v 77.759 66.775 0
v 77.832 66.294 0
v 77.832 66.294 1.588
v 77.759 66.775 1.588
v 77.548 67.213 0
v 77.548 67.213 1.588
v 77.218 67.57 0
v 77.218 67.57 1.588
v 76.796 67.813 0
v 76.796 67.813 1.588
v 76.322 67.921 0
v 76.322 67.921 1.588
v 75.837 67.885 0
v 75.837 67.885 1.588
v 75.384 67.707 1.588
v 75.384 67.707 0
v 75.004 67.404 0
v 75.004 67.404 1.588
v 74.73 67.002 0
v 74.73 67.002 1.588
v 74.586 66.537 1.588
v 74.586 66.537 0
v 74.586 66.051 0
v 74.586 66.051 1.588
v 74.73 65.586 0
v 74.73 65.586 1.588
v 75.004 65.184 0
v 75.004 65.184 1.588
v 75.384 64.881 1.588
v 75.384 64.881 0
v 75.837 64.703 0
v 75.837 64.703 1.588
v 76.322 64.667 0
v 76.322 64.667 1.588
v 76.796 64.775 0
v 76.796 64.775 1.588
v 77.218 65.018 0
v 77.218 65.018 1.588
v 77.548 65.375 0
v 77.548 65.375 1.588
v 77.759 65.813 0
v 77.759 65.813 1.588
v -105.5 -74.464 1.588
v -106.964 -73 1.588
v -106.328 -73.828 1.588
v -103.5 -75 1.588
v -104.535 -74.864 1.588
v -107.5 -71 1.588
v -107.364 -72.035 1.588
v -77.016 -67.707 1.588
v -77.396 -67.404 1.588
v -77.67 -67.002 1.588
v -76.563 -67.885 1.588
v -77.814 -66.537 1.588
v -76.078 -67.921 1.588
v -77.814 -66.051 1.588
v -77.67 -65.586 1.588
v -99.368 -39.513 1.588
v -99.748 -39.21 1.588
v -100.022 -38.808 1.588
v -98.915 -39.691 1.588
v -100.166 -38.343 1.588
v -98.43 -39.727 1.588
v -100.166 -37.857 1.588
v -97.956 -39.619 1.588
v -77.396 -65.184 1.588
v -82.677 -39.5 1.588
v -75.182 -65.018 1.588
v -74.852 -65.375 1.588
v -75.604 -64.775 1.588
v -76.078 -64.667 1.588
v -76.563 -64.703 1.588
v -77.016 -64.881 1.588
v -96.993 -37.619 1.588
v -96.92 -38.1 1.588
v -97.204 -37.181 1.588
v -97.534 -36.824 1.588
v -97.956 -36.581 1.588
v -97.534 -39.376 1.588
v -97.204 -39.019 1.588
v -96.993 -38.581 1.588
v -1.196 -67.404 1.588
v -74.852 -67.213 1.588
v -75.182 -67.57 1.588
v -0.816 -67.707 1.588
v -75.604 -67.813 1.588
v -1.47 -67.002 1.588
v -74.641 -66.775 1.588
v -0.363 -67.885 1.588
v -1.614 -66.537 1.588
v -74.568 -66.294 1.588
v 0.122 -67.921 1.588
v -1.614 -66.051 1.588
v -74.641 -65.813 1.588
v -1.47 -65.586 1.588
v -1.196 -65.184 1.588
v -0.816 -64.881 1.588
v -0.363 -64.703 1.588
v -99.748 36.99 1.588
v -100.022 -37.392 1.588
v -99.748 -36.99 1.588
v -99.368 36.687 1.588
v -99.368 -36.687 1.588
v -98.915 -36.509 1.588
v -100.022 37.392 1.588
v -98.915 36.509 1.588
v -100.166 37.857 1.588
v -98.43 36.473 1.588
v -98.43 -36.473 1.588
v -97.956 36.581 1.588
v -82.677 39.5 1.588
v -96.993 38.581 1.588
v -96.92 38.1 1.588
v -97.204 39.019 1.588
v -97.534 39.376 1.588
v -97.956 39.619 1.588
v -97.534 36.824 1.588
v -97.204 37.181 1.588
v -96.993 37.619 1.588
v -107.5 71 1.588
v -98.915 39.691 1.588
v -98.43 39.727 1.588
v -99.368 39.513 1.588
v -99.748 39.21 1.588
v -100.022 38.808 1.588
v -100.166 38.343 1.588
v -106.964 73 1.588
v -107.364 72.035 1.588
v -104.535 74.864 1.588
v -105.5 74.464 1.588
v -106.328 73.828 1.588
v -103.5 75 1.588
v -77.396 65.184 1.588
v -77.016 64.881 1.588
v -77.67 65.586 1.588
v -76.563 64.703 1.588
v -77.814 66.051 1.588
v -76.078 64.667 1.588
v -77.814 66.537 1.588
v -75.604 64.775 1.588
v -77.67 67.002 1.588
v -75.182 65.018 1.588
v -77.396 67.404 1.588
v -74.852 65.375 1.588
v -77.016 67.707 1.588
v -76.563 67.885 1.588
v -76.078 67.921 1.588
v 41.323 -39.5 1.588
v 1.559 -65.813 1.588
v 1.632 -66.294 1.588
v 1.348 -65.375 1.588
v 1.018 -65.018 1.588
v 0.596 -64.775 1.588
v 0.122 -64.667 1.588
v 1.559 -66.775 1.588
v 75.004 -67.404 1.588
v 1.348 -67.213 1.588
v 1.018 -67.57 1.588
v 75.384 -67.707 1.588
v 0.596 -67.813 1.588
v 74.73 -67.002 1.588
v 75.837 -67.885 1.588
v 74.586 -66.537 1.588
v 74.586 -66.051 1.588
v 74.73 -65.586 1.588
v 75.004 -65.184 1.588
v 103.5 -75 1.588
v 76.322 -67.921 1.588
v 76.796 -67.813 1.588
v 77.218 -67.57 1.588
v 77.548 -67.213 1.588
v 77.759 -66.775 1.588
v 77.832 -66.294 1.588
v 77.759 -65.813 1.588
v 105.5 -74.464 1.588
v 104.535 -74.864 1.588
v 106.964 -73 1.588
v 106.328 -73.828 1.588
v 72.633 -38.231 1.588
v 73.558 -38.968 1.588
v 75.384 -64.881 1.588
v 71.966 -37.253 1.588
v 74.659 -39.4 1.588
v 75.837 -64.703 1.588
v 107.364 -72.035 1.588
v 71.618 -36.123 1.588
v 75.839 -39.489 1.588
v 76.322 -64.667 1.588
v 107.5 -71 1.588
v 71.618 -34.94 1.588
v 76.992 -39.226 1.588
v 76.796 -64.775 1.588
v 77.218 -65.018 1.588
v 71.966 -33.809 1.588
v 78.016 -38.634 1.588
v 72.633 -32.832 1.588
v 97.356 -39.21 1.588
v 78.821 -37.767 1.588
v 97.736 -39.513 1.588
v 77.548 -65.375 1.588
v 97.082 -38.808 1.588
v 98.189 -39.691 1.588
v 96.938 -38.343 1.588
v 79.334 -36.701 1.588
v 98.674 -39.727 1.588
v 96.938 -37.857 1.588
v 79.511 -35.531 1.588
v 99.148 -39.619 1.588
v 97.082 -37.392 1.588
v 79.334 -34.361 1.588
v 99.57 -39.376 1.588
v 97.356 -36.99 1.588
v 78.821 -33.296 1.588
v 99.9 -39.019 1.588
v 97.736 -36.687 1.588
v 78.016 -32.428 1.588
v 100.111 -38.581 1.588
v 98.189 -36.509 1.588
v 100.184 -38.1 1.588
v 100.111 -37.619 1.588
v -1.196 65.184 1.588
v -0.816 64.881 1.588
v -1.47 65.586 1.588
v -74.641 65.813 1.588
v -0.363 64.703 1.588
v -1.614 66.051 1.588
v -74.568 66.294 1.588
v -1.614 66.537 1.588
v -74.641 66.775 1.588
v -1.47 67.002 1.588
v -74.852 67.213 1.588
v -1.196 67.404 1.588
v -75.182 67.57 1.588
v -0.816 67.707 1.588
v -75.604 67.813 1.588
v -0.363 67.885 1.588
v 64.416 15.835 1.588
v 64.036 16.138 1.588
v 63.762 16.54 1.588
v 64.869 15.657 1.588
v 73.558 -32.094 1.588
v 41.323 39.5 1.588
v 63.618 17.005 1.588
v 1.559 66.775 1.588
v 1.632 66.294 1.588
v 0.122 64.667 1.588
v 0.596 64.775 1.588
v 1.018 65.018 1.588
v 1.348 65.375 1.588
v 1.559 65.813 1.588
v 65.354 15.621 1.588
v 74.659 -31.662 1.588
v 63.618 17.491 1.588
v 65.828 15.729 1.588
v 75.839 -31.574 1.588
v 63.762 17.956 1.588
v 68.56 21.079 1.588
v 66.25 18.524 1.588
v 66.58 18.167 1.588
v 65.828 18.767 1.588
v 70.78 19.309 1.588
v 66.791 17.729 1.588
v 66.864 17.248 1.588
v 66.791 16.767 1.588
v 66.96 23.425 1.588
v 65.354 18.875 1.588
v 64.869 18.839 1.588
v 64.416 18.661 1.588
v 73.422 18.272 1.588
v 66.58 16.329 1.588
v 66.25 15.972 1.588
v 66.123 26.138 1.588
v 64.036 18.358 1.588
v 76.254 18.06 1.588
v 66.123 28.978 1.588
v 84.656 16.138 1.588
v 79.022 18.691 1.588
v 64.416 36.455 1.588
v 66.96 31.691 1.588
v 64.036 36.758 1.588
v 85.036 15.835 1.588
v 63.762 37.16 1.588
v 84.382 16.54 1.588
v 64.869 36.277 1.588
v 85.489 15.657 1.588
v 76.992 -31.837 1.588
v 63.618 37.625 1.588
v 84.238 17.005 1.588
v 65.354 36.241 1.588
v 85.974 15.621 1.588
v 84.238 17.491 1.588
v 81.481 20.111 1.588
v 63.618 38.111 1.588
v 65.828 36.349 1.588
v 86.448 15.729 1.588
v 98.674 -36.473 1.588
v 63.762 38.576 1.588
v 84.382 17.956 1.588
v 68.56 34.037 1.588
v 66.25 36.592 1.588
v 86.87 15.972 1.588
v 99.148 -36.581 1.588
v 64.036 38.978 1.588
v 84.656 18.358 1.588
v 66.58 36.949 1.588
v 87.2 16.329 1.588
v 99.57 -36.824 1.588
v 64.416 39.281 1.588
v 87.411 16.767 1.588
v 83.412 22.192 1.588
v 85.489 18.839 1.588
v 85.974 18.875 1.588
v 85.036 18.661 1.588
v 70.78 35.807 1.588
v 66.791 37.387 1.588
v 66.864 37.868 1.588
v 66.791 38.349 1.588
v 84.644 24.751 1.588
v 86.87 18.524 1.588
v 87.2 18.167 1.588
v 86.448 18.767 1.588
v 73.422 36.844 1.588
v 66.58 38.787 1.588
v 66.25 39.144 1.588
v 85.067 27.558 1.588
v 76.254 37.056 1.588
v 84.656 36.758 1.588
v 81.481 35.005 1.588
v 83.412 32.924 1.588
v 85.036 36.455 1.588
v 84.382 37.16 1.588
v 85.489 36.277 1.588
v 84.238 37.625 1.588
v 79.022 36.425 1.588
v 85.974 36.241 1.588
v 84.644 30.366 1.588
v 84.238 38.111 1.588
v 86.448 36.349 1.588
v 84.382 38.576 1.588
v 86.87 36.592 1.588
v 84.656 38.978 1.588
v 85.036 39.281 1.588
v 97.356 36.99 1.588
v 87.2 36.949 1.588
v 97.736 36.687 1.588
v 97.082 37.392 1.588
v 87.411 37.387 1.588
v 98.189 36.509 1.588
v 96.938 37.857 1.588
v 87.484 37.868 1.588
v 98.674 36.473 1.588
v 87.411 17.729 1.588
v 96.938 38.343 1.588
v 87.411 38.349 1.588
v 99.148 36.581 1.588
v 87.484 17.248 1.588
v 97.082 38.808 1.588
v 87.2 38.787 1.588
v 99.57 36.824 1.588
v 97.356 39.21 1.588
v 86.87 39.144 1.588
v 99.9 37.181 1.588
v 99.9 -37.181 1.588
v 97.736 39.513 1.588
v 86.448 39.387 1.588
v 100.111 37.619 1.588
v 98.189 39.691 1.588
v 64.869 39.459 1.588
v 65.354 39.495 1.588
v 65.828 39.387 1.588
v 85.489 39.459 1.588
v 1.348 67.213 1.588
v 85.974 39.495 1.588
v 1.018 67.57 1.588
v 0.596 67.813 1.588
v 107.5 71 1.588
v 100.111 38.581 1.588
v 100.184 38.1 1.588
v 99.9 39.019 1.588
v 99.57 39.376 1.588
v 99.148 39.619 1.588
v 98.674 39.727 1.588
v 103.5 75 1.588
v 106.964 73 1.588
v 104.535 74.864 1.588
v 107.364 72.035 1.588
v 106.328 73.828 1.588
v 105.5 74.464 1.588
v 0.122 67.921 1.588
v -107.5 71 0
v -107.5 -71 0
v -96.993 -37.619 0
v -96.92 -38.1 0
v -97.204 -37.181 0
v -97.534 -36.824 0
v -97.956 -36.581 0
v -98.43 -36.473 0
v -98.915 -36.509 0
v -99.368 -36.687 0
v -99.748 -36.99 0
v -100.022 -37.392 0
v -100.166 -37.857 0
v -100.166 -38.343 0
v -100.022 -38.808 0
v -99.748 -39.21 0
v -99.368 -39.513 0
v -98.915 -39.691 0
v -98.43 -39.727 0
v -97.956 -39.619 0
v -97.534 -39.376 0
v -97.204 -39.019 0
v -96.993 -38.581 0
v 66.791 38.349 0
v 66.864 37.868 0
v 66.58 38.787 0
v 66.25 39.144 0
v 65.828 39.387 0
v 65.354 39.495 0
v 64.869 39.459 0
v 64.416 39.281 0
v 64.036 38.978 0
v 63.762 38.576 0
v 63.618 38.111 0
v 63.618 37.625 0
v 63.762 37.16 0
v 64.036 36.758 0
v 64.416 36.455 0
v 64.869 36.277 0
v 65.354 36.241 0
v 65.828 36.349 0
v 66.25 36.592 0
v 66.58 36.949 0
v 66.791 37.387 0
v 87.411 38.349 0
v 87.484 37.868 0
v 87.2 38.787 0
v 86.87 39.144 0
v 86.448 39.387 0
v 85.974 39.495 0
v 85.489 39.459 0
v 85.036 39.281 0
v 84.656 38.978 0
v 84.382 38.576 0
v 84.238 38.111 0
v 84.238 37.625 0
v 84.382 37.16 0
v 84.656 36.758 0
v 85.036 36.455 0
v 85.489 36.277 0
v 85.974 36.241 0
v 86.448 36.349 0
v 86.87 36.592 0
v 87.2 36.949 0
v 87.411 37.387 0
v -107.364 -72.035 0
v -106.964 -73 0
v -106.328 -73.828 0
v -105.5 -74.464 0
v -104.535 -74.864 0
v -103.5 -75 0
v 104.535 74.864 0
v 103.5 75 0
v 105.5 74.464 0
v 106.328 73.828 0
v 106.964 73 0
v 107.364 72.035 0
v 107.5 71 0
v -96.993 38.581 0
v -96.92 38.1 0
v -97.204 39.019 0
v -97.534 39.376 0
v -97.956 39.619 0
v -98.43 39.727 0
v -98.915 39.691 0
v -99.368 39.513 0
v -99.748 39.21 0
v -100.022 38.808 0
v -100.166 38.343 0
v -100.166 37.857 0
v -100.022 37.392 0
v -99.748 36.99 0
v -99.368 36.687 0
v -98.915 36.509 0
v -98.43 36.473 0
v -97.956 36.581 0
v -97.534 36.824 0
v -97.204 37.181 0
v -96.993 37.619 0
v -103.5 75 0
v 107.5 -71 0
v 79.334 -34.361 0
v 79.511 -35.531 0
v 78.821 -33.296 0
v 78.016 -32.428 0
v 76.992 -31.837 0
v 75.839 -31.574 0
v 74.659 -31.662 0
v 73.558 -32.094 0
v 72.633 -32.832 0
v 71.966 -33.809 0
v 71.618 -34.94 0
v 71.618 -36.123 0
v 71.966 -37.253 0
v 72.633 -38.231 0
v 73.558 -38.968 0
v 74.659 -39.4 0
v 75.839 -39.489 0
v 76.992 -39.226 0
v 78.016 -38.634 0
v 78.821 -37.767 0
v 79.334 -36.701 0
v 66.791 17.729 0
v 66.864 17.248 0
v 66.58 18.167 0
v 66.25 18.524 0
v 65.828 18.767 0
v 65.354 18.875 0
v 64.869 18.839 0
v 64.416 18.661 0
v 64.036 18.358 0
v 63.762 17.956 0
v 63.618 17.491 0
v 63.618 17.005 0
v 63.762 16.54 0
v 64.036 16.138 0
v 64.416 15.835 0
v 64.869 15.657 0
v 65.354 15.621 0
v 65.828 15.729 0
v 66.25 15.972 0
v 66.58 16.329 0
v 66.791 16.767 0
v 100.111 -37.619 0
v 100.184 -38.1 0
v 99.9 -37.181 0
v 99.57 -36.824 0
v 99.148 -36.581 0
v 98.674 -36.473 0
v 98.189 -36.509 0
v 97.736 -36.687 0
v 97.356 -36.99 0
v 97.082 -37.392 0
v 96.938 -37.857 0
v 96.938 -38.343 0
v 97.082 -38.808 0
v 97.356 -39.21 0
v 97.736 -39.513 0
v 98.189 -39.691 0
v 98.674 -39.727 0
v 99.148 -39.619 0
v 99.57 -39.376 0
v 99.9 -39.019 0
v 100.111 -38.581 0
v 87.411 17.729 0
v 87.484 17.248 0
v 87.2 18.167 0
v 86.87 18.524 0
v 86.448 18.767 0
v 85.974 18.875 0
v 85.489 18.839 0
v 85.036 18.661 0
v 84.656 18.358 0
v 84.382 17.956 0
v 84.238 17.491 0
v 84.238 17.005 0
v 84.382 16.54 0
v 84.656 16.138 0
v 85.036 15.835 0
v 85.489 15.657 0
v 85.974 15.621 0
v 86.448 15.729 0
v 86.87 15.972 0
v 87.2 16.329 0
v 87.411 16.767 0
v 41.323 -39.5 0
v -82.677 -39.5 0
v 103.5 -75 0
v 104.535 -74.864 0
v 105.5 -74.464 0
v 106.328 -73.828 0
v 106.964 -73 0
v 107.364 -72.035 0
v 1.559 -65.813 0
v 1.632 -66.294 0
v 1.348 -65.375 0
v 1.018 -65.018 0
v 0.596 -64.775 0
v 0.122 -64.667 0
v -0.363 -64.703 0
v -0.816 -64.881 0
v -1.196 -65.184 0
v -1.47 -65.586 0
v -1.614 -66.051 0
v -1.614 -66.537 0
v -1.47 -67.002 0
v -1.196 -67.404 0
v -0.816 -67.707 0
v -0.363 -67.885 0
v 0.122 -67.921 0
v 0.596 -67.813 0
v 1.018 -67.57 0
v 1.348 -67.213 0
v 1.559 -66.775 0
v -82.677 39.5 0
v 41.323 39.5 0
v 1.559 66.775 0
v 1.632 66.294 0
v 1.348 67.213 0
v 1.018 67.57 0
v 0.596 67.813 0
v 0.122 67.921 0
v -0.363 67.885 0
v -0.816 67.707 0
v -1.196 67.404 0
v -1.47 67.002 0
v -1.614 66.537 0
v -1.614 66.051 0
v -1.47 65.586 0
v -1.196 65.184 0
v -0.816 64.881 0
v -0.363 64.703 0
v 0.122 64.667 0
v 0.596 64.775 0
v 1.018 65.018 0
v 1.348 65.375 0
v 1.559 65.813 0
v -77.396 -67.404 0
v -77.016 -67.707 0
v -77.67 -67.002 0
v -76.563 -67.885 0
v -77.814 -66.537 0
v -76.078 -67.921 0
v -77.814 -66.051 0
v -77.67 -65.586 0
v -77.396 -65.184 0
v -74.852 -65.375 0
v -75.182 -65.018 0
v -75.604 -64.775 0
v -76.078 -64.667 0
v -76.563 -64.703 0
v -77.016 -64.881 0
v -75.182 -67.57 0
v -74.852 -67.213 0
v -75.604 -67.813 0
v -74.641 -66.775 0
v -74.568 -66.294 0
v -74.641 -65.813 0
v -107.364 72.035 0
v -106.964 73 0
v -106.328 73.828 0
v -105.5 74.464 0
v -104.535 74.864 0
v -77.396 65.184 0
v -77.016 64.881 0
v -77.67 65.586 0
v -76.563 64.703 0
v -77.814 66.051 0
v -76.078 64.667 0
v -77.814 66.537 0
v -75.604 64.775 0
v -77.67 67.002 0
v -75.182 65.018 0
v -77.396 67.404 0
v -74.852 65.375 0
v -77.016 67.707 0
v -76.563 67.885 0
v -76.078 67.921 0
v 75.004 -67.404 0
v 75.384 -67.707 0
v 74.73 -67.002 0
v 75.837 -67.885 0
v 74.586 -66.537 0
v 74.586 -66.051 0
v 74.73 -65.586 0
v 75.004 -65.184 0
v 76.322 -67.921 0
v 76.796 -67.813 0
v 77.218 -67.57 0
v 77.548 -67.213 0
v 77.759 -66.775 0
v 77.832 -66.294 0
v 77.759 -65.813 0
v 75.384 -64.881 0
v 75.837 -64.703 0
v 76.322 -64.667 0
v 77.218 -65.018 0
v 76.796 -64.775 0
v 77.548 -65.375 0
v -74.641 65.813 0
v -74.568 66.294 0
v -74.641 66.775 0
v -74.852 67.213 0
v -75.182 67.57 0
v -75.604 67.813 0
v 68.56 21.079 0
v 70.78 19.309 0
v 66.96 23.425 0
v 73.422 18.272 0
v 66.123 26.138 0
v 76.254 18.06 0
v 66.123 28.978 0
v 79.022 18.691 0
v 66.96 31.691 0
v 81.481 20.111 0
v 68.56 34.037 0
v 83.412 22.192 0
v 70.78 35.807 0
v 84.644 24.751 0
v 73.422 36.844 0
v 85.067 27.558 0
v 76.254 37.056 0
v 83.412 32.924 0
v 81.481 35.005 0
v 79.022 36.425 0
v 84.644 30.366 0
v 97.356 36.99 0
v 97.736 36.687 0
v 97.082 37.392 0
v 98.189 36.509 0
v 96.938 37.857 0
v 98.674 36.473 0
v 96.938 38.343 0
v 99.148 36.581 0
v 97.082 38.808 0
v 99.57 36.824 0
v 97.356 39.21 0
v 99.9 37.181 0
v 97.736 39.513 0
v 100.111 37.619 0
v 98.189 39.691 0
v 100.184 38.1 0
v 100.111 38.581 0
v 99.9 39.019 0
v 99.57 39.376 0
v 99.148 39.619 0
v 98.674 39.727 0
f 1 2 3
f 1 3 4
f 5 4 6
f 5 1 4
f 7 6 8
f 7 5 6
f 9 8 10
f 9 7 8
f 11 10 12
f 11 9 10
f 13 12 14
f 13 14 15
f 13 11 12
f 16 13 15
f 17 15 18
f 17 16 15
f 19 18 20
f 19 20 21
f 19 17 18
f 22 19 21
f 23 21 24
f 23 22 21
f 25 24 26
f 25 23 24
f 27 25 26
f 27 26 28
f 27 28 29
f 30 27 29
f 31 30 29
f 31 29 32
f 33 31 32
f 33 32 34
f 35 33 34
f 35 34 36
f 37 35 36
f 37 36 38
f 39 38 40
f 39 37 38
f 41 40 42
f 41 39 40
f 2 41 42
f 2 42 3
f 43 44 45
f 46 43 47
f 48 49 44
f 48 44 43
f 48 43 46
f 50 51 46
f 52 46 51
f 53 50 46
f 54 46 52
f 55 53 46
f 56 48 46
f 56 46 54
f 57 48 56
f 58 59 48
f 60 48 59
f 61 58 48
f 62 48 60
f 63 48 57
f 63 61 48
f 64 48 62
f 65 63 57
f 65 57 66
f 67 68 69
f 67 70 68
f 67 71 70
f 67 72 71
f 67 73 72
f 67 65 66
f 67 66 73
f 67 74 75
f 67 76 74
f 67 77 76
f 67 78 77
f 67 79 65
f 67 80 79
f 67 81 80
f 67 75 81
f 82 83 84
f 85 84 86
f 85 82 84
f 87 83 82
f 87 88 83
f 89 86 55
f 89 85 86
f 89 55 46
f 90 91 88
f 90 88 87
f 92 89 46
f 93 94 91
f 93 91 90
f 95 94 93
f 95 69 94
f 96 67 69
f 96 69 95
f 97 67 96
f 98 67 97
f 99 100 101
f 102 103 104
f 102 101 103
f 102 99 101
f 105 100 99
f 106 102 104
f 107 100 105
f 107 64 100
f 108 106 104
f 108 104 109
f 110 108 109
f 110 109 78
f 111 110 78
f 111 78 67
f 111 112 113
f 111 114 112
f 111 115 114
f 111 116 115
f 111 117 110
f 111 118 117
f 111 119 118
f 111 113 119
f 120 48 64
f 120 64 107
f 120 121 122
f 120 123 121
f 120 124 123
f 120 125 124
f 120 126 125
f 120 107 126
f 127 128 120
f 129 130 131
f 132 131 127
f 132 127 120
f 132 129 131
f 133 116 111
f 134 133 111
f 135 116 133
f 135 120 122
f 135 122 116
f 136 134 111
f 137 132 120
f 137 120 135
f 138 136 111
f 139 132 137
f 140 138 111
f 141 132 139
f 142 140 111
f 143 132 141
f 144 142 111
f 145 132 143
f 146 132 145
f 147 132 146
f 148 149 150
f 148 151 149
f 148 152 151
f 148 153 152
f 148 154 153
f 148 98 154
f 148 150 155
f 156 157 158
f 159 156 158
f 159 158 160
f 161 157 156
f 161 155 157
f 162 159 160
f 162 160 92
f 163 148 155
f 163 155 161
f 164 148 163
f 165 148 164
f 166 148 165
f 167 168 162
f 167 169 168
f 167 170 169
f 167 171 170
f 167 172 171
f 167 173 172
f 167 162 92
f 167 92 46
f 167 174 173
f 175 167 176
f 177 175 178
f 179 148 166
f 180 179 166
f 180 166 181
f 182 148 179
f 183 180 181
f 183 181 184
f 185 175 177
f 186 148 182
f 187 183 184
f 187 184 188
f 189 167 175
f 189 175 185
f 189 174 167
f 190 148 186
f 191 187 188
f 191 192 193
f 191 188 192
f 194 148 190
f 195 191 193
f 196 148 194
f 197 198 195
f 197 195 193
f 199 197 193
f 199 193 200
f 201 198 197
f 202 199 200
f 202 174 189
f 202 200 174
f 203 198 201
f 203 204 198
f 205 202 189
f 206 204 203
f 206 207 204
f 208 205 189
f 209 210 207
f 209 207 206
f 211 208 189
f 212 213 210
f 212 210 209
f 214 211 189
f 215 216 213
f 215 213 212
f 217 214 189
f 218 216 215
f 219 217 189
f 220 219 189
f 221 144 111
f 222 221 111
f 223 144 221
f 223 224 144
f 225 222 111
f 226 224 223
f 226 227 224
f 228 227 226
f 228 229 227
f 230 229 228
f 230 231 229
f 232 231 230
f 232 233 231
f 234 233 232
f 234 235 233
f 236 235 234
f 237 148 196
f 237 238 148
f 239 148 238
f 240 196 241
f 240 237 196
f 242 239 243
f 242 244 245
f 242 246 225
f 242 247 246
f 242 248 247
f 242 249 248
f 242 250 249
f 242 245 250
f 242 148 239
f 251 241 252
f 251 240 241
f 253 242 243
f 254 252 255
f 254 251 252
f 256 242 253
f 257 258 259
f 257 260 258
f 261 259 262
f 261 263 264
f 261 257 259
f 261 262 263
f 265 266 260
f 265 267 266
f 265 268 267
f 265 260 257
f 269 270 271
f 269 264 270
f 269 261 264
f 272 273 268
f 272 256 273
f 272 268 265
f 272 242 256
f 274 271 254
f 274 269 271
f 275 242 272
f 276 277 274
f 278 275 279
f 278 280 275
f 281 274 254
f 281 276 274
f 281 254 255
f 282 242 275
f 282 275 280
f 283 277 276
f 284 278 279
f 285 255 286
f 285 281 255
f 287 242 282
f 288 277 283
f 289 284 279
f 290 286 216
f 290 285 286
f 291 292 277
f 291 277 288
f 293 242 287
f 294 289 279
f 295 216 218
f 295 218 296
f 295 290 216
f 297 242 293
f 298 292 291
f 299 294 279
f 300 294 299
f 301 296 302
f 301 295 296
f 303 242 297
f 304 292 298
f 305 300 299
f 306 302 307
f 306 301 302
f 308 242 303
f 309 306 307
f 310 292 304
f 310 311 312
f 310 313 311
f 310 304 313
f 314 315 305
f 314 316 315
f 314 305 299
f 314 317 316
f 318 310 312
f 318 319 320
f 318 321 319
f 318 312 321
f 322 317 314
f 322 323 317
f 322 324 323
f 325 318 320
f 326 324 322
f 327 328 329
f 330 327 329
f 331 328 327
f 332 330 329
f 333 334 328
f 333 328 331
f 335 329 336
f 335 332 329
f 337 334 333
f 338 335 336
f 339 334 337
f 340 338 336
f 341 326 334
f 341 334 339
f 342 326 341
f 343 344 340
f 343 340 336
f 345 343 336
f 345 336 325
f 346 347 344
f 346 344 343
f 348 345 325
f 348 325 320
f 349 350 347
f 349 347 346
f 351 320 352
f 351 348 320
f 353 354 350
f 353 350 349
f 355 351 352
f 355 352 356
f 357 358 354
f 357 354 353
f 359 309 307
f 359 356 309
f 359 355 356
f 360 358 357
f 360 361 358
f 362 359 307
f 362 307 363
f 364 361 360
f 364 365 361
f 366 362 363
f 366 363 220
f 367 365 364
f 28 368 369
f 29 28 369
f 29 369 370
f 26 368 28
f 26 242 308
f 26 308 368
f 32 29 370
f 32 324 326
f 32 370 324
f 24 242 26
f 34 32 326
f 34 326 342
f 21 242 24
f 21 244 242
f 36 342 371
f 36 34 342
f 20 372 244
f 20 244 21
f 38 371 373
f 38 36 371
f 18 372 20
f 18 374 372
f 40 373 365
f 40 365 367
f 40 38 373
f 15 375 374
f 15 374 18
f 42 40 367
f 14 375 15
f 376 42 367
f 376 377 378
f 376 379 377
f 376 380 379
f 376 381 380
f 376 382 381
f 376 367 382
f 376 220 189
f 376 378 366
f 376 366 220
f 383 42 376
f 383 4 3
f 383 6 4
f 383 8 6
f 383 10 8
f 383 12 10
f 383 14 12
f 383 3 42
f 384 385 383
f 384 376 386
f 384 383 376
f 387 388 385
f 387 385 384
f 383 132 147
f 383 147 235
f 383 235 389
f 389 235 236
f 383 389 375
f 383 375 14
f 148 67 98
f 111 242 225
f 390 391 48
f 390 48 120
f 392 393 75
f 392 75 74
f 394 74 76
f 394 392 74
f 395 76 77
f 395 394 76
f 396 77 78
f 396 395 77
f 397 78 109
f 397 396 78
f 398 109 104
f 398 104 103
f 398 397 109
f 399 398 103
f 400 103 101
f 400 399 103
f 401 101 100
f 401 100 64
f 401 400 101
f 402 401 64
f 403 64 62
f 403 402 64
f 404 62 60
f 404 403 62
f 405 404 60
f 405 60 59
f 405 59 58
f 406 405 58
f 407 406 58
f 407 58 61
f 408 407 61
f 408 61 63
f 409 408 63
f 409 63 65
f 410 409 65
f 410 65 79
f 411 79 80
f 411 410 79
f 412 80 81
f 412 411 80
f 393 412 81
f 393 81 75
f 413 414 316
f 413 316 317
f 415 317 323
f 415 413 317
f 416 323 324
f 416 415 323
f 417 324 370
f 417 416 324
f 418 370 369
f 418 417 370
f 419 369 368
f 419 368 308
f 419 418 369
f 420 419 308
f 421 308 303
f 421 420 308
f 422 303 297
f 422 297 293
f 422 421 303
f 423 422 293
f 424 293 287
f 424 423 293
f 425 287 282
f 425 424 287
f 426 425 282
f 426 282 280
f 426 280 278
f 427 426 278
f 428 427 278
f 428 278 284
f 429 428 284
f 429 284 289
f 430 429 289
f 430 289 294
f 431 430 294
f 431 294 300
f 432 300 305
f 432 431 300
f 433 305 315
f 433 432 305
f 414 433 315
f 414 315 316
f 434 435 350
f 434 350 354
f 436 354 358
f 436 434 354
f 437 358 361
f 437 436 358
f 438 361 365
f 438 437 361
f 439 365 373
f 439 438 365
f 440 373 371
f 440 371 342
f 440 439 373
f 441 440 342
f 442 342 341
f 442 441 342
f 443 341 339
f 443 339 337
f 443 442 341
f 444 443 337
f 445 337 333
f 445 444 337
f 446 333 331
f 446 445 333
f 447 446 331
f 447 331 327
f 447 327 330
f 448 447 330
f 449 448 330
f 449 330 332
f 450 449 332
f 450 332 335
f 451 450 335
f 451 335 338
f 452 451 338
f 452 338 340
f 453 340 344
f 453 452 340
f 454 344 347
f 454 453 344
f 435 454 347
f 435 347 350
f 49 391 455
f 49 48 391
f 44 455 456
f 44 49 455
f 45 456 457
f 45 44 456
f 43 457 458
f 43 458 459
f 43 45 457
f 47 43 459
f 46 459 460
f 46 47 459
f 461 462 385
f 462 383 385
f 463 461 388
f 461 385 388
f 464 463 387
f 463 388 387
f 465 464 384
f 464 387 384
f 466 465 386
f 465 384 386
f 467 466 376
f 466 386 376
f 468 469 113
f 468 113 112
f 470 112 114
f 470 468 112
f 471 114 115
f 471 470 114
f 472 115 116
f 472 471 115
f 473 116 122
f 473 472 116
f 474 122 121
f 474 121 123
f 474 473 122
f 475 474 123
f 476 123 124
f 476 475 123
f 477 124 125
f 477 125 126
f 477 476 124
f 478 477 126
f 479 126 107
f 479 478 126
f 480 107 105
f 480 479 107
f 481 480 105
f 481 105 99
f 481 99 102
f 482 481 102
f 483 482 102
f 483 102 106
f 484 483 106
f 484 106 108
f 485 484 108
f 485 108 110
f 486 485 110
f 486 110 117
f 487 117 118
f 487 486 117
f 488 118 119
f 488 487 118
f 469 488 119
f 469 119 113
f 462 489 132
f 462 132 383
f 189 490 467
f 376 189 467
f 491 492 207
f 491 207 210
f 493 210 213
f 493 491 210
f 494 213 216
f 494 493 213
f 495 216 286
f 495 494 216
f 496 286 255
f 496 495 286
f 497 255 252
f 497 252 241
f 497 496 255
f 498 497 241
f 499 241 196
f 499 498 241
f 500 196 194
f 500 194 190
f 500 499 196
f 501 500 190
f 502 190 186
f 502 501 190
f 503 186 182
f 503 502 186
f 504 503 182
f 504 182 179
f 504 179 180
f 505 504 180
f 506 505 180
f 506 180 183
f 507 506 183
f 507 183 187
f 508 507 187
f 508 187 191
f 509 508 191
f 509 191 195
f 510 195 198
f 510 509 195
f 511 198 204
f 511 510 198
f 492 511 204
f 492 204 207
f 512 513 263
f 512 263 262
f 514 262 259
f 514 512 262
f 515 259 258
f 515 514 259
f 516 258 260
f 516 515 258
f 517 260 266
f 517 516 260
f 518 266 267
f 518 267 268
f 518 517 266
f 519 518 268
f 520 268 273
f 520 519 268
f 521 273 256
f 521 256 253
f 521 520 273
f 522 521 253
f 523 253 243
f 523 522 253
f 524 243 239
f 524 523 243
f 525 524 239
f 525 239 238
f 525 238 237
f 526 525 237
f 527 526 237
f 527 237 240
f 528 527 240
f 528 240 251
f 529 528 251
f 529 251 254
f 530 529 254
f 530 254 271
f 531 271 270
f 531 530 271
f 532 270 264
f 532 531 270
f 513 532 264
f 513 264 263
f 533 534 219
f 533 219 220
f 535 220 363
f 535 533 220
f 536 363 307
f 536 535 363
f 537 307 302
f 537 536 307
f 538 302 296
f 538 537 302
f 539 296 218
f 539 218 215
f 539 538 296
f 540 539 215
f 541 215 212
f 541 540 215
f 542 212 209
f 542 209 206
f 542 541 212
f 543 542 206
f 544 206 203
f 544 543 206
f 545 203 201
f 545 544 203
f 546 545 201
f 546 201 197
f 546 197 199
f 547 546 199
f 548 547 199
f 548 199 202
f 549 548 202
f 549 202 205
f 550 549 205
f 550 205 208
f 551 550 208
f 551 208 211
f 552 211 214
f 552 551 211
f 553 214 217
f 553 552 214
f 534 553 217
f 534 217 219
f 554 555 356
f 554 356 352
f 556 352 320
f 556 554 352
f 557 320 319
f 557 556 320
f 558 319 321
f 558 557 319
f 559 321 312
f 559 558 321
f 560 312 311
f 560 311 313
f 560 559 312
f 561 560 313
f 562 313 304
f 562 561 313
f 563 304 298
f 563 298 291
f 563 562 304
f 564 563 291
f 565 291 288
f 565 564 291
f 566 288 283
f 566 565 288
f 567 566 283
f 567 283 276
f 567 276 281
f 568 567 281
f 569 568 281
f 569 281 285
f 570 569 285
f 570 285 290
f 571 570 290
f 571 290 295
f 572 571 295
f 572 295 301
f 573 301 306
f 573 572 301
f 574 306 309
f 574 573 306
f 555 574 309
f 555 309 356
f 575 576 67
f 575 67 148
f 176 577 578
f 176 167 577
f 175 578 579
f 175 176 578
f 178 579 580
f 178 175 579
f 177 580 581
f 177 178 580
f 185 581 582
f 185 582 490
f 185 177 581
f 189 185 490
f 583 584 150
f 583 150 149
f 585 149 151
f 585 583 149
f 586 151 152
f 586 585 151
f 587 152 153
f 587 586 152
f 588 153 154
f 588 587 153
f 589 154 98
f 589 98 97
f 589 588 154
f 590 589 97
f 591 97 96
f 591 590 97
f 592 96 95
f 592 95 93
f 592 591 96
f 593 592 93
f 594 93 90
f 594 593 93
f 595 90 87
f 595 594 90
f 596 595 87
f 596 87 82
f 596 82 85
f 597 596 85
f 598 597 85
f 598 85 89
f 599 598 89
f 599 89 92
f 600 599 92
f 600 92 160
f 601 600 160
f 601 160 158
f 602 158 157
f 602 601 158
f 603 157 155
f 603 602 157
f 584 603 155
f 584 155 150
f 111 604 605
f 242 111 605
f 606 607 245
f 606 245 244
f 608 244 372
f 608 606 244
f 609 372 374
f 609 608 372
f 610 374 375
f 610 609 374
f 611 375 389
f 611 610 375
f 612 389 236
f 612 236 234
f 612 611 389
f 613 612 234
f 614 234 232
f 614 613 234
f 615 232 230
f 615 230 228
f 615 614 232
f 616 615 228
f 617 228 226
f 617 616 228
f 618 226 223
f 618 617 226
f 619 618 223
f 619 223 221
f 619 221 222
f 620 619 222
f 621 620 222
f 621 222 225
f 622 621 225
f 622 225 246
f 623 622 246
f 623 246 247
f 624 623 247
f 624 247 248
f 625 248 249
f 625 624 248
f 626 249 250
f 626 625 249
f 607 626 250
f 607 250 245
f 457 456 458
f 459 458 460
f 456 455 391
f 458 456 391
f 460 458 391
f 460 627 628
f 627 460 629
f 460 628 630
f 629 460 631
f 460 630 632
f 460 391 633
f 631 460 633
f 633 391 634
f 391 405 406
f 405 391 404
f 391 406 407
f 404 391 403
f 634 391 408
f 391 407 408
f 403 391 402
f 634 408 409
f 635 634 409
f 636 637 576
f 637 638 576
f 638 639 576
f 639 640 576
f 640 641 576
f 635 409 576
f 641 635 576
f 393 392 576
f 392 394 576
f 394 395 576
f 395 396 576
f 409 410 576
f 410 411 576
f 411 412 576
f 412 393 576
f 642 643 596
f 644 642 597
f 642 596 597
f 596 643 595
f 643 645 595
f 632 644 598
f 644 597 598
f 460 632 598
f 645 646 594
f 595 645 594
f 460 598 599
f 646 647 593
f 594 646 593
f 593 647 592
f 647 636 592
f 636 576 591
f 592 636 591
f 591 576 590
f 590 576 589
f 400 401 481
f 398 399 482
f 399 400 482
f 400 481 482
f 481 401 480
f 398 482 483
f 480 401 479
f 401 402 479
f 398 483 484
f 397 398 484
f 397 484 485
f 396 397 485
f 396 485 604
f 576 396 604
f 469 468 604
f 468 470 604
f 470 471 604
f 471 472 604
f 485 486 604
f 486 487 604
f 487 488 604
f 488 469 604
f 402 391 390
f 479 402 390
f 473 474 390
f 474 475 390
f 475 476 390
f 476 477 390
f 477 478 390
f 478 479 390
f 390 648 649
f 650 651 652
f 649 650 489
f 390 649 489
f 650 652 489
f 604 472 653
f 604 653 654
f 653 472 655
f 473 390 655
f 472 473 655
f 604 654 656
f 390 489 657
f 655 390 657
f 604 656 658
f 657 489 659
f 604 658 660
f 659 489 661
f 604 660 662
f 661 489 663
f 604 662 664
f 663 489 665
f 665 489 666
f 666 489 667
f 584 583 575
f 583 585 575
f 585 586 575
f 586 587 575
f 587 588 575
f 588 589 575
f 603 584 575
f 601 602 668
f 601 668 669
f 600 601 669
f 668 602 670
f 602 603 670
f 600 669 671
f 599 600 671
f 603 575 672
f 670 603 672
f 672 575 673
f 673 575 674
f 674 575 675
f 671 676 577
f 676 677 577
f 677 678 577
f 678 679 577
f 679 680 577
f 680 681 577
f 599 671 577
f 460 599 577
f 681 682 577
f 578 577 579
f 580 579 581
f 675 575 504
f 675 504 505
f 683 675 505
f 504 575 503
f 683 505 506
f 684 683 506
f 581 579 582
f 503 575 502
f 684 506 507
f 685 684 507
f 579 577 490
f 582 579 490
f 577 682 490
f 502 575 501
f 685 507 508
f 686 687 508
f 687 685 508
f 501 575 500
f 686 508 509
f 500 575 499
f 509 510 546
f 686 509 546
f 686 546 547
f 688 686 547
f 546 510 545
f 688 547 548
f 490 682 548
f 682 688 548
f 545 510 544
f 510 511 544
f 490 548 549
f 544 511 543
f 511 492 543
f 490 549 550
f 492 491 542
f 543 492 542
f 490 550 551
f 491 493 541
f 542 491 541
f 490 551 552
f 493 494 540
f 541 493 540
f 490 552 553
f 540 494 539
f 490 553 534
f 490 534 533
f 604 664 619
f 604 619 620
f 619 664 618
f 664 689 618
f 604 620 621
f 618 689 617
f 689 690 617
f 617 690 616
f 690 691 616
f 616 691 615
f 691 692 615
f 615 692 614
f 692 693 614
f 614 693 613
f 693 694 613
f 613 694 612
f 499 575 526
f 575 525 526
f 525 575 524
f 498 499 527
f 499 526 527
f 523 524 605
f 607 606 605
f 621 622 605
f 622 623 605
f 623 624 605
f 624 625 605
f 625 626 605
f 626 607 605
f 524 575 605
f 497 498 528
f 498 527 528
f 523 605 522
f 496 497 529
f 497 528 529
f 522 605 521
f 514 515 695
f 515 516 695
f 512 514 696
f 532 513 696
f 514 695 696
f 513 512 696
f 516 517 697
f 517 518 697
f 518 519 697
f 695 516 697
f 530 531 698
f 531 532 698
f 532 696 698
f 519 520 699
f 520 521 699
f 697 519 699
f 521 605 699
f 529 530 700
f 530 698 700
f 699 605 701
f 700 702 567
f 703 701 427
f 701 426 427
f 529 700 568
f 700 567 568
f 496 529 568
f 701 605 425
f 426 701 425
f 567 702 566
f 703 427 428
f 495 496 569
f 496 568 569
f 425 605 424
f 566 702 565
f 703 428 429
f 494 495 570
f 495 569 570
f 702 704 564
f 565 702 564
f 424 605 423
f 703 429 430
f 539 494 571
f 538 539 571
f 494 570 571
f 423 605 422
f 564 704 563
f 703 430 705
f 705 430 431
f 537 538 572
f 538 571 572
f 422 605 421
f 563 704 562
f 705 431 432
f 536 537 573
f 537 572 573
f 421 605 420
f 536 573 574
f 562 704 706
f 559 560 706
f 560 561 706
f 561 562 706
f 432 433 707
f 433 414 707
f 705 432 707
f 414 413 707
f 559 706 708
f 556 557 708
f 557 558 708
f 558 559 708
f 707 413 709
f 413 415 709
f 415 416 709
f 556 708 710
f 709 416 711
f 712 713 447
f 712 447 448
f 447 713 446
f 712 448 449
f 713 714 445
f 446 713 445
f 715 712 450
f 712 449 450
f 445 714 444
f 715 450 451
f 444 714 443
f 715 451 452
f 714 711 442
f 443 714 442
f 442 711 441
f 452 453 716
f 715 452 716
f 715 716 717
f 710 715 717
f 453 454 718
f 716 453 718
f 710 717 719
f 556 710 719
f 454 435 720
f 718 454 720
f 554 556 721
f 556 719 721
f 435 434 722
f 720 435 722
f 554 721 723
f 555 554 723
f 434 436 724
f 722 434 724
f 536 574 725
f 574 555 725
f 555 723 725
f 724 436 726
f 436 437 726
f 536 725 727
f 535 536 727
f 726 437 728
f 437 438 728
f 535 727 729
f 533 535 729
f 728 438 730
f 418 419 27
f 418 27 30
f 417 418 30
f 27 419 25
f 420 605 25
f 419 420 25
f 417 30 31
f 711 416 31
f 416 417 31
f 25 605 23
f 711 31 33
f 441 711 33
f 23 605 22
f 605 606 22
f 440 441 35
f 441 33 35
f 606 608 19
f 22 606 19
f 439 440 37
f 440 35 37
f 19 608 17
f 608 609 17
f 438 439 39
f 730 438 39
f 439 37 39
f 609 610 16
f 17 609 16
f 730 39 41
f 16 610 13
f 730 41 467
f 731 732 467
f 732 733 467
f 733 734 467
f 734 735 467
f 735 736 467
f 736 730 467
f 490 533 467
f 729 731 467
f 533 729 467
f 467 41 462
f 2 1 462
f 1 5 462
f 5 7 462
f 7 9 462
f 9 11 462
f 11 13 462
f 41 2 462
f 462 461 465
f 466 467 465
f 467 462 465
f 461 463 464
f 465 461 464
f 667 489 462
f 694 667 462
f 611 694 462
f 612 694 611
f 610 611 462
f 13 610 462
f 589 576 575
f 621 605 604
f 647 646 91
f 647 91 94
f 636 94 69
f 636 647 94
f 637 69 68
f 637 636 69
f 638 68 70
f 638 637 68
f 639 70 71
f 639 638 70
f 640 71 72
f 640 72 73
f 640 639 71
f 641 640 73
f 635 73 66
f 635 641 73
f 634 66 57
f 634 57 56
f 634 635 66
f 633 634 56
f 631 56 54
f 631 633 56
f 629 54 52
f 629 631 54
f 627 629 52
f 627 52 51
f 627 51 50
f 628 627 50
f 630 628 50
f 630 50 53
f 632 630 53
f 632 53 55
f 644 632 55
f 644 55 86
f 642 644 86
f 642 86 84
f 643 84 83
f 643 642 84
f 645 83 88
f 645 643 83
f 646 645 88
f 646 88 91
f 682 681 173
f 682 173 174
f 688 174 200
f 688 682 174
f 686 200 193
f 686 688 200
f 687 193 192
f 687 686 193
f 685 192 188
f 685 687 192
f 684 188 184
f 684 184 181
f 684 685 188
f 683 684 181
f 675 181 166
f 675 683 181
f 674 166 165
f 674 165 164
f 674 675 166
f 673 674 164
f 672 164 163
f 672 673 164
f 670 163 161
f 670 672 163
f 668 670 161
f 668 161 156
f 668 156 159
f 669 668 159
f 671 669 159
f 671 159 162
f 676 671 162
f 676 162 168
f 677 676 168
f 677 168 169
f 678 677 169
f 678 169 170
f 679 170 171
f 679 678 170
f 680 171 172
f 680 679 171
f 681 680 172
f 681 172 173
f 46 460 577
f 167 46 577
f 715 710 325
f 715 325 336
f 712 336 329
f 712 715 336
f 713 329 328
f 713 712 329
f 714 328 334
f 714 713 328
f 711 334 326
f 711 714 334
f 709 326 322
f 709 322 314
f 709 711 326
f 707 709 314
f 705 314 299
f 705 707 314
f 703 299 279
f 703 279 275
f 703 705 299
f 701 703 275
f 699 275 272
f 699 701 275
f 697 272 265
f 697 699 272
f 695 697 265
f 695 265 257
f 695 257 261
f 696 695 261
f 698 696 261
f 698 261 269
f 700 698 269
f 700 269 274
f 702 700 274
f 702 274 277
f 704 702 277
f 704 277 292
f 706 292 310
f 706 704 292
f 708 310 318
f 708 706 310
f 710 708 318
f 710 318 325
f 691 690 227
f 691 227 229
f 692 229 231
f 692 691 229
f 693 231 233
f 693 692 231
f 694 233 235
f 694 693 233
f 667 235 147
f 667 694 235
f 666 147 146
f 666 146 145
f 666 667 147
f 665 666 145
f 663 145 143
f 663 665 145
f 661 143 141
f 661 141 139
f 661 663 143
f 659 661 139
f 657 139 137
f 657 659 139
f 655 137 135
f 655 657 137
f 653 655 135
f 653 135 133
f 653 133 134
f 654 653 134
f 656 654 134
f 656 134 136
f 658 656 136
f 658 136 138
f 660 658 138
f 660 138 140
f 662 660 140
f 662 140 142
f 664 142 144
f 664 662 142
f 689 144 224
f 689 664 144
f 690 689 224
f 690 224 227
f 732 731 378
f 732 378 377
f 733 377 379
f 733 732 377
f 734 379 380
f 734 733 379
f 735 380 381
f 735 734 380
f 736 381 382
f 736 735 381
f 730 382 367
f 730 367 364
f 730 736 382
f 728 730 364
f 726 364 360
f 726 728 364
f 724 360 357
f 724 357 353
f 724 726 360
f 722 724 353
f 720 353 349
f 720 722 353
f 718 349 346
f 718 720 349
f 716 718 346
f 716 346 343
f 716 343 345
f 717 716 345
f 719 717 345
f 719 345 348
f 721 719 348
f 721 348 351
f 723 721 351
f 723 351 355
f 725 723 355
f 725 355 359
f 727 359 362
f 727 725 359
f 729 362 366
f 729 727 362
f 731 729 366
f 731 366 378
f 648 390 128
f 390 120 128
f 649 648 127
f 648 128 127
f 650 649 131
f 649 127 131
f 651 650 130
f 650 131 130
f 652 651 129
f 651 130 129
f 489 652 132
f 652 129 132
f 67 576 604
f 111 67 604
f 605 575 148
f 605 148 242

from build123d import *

# Parameters (mm, degrees)
F0_W     = 215
F0_H     = 150
F0_R     = 1.63195
F0_R_2   = 3.96875
F0_W_2   = 124
F0_H_2   = 79
F0_R_3   = 9.525
F1_DEPTH = 1.5875
F2_R     = 4


with BuildPart() as f1:
    # F0 (on Top) → F1 (new body)
    with BuildSketch(Plane.XY):
        Rectangle(F0_W, F0_H)
        with Locations((-76.2, -66.294)):
            Circle(F0_R, mode=Mode.SUBTRACT)
        with Locations((-98.552, -38.1)):
            Circle(F0_R, mode=Mode.SUBTRACT)
        with Locations((0, -66.294)):
            Circle(F0_R, mode=Mode.SUBTRACT)
        with Locations((76.2, -66.294)):
            Circle(F0_R, mode=Mode.SUBTRACT)
        with Locations((98.552, -38.1)):
            Circle(F0_R, mode=Mode.SUBTRACT)
        with Locations((75.542, -35.53125)):
            Circle(F0_R_2, mode=Mode.SUBTRACT)
        with Locations((-20.677, 0)):
            Rectangle(F0_W_2, F0_H_2, mode=Mode.SUBTRACT)
        with Locations((-98.552, 38.1)):
            Circle(F0_R, mode=Mode.SUBTRACT)
        with Locations((-76.2, 66.294)):
            Circle(F0_R, mode=Mode.SUBTRACT)
        with Locations((65.232, 17.24805)):
            Circle(F0_R, mode=Mode.SUBTRACT)
        with Locations((85.852, 17.24805)):
            Circle(F0_R, mode=Mode.SUBTRACT)
        with Locations((75.542, 27.55805)):
            Circle(F0_R_3, mode=Mode.SUBTRACT)
        with Locations((0, 66.294)):
            Circle(F0_R, mode=Mode.SUBTRACT)
        with Locations((65.232, 37.86805)):
            Circle(F0_R, mode=Mode.SUBTRACT)
        with Locations((85.852, 37.86805)):
            Circle(F0_R, mode=Mode.SUBTRACT)
        with Locations((98.552, 38.1)):
            Circle(F0_R, mode=Mode.SUBTRACT)
        with Locations((76.2, 66.294)):
            Circle(F0_R, mode=Mode.SUBTRACT)
    extrude(amount=F1_DEPTH)

    # F2
    f2_edges = [f1.edges().sort_by_distance(p)[0] for p in [
        (-107.5, 75, 0.79375),
        (-107.5, -75, 0.79375),
        (107.5, -75, 0.79375),
        (107.5, 75, 0.79375),
    ]]
    fillet(f2_edges, radius=F2_R)


solid = f1.part
